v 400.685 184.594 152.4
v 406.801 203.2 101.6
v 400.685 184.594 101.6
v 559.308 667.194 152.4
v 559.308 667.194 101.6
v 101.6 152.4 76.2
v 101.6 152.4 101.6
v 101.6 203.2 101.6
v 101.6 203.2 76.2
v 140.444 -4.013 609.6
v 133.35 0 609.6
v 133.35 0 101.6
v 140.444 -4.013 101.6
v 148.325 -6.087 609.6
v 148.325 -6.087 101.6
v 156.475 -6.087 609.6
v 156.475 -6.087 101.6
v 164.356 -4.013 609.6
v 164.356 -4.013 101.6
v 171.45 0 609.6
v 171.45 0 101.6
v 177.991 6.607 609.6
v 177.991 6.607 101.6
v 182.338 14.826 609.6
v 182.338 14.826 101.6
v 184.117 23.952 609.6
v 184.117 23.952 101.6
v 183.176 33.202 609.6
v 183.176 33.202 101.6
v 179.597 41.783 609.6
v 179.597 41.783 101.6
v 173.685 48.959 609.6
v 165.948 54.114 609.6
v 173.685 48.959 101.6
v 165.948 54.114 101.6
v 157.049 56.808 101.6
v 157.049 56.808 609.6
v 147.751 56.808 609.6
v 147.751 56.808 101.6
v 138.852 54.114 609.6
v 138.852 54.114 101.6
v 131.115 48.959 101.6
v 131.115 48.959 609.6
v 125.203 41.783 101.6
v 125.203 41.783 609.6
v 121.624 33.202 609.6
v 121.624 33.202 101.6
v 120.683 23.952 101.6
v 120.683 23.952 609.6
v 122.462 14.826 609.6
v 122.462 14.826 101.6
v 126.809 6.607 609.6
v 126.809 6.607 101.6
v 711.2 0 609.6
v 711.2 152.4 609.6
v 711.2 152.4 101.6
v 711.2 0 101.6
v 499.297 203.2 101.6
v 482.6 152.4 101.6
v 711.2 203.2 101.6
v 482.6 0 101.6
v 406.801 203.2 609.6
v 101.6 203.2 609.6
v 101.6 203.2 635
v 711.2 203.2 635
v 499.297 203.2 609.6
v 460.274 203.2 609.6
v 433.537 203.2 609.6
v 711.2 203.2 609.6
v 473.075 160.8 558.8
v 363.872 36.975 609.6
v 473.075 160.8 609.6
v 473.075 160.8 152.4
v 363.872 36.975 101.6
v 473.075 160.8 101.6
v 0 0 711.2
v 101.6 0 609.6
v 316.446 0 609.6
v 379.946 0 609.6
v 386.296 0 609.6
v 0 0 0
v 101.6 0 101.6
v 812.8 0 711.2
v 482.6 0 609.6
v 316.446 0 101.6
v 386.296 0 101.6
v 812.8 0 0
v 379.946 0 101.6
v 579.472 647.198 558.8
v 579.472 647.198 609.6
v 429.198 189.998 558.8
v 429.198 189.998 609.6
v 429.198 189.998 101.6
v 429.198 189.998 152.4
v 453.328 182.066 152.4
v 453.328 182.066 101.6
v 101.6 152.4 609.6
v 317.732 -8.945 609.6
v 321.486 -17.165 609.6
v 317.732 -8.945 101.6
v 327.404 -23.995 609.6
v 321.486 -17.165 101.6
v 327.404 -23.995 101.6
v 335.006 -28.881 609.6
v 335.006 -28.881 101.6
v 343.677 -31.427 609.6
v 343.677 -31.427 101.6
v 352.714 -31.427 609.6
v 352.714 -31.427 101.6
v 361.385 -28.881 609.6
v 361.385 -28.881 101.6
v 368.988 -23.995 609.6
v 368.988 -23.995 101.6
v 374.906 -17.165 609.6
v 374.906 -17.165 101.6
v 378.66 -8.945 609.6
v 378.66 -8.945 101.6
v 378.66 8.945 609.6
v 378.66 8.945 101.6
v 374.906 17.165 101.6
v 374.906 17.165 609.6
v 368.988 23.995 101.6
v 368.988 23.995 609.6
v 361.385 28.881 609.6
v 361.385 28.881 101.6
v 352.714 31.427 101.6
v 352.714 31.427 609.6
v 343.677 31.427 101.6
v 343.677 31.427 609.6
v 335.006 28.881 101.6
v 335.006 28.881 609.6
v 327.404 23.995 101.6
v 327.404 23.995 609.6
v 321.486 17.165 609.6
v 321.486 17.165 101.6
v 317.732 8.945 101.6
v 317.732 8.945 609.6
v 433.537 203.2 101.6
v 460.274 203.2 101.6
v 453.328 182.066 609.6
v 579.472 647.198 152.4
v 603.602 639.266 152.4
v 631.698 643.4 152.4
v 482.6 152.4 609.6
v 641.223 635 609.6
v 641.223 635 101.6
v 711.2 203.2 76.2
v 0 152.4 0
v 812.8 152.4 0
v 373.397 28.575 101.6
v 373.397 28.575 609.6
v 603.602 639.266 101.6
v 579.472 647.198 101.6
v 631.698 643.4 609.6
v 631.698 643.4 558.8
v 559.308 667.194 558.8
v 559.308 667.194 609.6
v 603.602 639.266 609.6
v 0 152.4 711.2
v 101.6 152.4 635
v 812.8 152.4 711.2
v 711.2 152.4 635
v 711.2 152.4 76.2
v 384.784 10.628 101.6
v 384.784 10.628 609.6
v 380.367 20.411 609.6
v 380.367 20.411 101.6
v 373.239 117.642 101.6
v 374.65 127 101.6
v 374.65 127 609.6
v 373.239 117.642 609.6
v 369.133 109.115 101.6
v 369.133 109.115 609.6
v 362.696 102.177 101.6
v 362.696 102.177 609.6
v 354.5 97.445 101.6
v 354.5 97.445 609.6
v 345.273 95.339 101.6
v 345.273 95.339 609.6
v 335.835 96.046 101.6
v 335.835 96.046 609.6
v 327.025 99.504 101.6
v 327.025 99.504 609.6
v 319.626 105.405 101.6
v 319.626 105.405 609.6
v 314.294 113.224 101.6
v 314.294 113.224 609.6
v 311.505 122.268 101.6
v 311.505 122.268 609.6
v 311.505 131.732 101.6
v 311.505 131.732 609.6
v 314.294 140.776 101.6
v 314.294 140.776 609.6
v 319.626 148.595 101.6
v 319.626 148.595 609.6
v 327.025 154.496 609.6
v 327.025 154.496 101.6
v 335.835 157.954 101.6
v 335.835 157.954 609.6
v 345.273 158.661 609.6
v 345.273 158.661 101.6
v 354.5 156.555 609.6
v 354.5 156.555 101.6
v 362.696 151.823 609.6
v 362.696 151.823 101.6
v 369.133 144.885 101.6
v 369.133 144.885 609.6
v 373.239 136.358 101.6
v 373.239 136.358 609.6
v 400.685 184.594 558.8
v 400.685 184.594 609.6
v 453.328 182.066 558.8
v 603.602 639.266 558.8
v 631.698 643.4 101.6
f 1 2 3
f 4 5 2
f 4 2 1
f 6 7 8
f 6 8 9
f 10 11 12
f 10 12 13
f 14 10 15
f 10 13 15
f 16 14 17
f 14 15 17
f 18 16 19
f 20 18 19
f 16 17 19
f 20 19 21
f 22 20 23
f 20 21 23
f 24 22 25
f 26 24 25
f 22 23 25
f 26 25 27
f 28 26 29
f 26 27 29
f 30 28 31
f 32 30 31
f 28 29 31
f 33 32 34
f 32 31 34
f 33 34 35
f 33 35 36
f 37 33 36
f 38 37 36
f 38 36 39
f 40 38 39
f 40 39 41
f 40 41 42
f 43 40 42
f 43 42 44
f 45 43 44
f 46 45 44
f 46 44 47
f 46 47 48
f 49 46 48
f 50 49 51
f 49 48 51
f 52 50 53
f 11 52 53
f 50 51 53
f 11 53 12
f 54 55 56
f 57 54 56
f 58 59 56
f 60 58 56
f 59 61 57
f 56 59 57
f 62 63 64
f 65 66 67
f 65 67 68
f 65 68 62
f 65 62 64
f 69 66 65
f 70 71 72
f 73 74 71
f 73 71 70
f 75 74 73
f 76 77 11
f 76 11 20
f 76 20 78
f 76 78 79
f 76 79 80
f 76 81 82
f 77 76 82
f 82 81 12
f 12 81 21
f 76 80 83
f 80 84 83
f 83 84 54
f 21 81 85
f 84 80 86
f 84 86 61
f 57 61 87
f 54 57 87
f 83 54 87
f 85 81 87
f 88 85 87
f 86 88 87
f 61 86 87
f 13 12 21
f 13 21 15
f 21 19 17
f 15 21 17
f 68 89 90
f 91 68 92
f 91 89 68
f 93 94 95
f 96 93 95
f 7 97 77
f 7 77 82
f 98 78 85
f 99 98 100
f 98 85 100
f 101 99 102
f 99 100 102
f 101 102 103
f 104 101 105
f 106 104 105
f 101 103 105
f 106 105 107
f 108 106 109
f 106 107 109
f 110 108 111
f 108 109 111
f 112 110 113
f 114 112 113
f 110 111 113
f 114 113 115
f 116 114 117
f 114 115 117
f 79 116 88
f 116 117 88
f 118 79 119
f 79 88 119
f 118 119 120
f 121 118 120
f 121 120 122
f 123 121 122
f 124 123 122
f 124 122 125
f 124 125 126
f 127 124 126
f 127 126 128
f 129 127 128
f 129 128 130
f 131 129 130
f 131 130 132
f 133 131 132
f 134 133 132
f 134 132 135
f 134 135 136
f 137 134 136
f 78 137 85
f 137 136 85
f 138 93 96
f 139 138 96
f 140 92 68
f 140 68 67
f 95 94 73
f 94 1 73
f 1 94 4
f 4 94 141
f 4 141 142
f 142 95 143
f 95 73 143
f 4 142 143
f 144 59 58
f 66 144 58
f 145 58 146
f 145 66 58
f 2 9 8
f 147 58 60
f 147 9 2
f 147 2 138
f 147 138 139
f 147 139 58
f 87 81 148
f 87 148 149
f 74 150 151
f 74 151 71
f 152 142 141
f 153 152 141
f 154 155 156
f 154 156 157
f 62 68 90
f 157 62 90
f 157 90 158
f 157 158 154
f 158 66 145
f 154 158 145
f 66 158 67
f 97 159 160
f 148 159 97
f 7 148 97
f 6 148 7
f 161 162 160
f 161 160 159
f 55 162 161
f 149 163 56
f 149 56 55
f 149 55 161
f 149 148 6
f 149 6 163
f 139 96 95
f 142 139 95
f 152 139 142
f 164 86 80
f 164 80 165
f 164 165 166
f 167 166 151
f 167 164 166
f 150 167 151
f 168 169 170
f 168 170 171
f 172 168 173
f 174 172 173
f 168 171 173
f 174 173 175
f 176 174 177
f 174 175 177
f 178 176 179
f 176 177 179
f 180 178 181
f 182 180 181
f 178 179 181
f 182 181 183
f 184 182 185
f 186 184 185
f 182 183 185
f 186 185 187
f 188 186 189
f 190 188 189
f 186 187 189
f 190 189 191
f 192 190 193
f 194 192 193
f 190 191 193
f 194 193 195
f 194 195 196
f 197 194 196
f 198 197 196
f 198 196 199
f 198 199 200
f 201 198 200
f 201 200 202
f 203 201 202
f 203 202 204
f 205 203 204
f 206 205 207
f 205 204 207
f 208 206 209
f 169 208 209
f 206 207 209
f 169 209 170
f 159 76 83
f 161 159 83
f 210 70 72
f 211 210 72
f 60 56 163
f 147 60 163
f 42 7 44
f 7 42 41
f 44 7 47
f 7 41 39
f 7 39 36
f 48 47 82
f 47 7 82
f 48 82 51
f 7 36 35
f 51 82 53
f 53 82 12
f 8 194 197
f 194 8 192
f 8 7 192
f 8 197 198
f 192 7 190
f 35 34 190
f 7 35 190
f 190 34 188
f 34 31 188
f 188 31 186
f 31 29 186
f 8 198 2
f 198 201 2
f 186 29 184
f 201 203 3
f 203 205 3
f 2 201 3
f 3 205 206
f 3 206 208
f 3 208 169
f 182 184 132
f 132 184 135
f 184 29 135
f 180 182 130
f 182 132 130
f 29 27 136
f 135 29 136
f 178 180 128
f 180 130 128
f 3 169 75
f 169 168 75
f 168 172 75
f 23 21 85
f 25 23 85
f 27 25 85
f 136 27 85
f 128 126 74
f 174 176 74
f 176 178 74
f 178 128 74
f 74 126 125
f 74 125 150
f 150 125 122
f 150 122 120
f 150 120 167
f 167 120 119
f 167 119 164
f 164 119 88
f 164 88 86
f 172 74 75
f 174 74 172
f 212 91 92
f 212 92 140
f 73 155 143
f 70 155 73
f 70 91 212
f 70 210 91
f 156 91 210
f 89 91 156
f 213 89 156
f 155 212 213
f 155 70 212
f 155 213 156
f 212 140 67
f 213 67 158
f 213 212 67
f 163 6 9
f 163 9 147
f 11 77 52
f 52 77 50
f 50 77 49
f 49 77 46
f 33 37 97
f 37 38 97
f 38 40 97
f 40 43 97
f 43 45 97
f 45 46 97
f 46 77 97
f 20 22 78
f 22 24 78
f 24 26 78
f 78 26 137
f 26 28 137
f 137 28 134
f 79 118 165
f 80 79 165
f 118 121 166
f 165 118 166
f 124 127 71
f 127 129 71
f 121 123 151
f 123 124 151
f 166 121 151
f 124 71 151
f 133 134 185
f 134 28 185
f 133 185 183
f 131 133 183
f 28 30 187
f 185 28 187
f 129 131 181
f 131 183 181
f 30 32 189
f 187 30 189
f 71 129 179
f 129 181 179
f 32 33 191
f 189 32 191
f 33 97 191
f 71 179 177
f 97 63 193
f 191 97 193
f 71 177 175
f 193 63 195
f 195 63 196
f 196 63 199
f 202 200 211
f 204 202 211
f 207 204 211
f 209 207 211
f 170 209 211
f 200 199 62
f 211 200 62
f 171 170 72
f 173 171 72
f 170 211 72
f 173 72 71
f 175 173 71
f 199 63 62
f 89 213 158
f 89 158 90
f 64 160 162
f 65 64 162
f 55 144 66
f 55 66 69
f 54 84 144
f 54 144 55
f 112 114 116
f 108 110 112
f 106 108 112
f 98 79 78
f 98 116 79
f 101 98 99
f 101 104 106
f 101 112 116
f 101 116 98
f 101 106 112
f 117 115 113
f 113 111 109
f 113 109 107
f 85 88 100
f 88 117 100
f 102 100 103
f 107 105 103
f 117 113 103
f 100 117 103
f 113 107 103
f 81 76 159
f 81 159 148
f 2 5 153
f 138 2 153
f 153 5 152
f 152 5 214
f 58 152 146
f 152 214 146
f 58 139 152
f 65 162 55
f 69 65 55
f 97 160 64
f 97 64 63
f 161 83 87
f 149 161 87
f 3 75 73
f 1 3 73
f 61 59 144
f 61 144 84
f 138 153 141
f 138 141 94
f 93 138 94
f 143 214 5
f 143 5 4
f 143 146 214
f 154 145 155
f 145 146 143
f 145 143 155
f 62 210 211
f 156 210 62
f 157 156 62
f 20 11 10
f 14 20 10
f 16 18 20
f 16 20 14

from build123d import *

# Parameters (mm, degrees)
SKETCH1_W            = 812.8
SKETCH1_H            = 711.2
BOSS_EXTRUDE1_DEPTH  = 152.4
SKETCH2_W            = 609.6
SKETCH2_H            = 508
CUT_EXTRUDE1_DEPTH   = 152.4
SKETCH4_R            = 31.75
BOSS_EXTRUDE3_DEPTH  = 508
BOSS_EXTRUDE4_DEPTH  = 508
SKETCH7_R            = 31.75
BOSS_EXTRUDE5_DEPTH  = 508
BOSS_EXTRUDE6_DEPTH  = 508
BOSS_EXTRUDE7_DEPTH  = 508
SKETCH11_W           = 50.8
SKETCH11_H           = 508
BOSS_EXTRUDE8_DEPTH  = 76.2
CUT_EXTRUDE2_DEPTH   = 508
SKETCH14_W           = 609.6
SKETCH14_H           = 25.4
BOSS_EXTRUDE10_DEPTH = 50.8
SKETCH15_R           = 31.75
BOSS_EXTRUDE11_DEPTH = 508


with BuildPart() as part:
    # Sketch1 → Boss-Extrude1 (new body)
    with BuildSketch(Plane(origin=(0, 0, 0), x_dir=(1, 0, 0), z_dir=(0, 1, 0))):
        with Locations((406.4, -355.6)):
            Rectangle(SKETCH1_W, SKETCH1_H)
    extrude(amount=BOSS_EXTRUDE1_DEPTH)

    # Sketch2 → Cut-Extrude1 (cut)
    with BuildSketch(Plane(origin=(0, 152.4, 0), x_dir=(1, 0, 0), z_dir=(0, 1, 0))):
        with Locations((406.4, -355.6)):
            Rectangle(SKETCH2_W, SKETCH2_H)
    extrude(amount=-CUT_EXTRUDE1_DEPTH, mode=Mode.SUBTRACT)

    # Sketch4 → Boss-Extrude3 (add)
    with BuildSketch(Plane.XY.offset(101.6)):
        with Locations(Location((152.4, 25.4, 0), (0, 0, 233.130102354))):
            Circle(SKETCH4_R)
    extrude(amount=BOSS_EXTRUDE3_DEPTH)

    # Sketch6 → Boss-Extrude4 (add)
    with BuildSketch(Plane.XY.offset(101.6)):
        with BuildLine():
            Line((373.396614636, 28.575), (482.6, 152.4))
            Line((482.6, 152.4), (482.6, 0))
            Line((482.6, 0), (386.295833398, 0))
            ThreePointArc((386.295833398, 0), (382.921614636, 15.675781238), (373.396614636, 28.575))
        make_face()
    extrude(amount=BOSS_EXTRUDE4_DEPTH)

    # Sketch7 → Boss-Extrude5 (add)
    with BuildSketch(Plane.XY.offset(101.6)):
        with Locations(Location((348.195833398, 0, 0), (0, 0, 180))):
            Circle(SKETCH7_R)
    extrude(amount=BOSS_EXTRUDE5_DEPTH)

    # Sketch8 → Boss-Extrude6 (add)
    with BuildSketch(Plane.XY.offset(101.6)):
        Polygon((373.396614636, 28.575), (363.871614636, 36.975260413), (473.075, 160.800260413), (482.6, 152.4), align=None)
    extrude(amount=BOSS_EXTRUDE6_DEPTH)

    # Sketch9 → Boss-Extrude7 (add)
    with BuildSketch(Plane.XY.offset(609.6)):
        Polygon((482.6, 152.4), (641.222949159, 635), (631.697949159, 643.400260413), (473.075, 160.800260413), align=None)
    extrude(amount=-BOSS_EXTRUDE7_DEPTH)

    # Sketch11 → Boss-Extrude8 (add)
    with BuildSketch(Plane(origin=(379.25081554, -124.653714944, 0), x_dir=(0, 0, 1), z_dir=(-0.95, 0.3122498999199199, 0))):
        with Locations((584.2, 554.477868797)):
            Rectangle(SKETCH11_W, SKETCH11_H)
        with Locations((127, 554.477868797)):
            Rectangle(SKETCH11_W, SKETCH11_H)
    extrude(amount=BOSS_EXTRUDE8_DEPTH)

    # Sketch12 → Cut-Extrude2 (cut)
    with BuildSketch(Plane(origin=(0, 0, 101.6), x_dir=(-1, 0, 0), z_dir=(0, 0, -1))):
        Polygon((-579.47237543, 647.197555329), (-429.198002543, 189.997555329), (-453.328002543, 182.066407871), (-603.60237543, 639.266407871), align=None)
    extrude(amount=-CUT_EXTRUDE2_DEPTH, mode=Mode.SUBTRACT)

    # Sketch14 → Boss-Extrude10 (add)
    with BuildSketch(Plane(origin=(0, 152.4, 0), x_dir=(1, 0, 0), z_dir=(0, 1, 0))):
        with Locations((406.4, -88.9)):
            Rectangle(SKETCH14_W, SKETCH14_H)
        with Locations((406.4, -622.3)):
            Rectangle(SKETCH14_W, SKETCH14_H)
    extrude(amount=BOSS_EXTRUDE10_DEPTH)

    # Sketch15 → Boss-Extrude11 (add)
    with BuildSketch(Plane(origin=(0, 0, 609.6), x_dir=(-1, 0, 0), z_dir=(0, 0, -1))):
        with Locations(Location((-342.9, 127, 0), (0, 0, 180))):
            Circle(SKETCH15_R)
    extrude(amount=BOSS_EXTRUDE11_DEPTH)


solid = part.part
